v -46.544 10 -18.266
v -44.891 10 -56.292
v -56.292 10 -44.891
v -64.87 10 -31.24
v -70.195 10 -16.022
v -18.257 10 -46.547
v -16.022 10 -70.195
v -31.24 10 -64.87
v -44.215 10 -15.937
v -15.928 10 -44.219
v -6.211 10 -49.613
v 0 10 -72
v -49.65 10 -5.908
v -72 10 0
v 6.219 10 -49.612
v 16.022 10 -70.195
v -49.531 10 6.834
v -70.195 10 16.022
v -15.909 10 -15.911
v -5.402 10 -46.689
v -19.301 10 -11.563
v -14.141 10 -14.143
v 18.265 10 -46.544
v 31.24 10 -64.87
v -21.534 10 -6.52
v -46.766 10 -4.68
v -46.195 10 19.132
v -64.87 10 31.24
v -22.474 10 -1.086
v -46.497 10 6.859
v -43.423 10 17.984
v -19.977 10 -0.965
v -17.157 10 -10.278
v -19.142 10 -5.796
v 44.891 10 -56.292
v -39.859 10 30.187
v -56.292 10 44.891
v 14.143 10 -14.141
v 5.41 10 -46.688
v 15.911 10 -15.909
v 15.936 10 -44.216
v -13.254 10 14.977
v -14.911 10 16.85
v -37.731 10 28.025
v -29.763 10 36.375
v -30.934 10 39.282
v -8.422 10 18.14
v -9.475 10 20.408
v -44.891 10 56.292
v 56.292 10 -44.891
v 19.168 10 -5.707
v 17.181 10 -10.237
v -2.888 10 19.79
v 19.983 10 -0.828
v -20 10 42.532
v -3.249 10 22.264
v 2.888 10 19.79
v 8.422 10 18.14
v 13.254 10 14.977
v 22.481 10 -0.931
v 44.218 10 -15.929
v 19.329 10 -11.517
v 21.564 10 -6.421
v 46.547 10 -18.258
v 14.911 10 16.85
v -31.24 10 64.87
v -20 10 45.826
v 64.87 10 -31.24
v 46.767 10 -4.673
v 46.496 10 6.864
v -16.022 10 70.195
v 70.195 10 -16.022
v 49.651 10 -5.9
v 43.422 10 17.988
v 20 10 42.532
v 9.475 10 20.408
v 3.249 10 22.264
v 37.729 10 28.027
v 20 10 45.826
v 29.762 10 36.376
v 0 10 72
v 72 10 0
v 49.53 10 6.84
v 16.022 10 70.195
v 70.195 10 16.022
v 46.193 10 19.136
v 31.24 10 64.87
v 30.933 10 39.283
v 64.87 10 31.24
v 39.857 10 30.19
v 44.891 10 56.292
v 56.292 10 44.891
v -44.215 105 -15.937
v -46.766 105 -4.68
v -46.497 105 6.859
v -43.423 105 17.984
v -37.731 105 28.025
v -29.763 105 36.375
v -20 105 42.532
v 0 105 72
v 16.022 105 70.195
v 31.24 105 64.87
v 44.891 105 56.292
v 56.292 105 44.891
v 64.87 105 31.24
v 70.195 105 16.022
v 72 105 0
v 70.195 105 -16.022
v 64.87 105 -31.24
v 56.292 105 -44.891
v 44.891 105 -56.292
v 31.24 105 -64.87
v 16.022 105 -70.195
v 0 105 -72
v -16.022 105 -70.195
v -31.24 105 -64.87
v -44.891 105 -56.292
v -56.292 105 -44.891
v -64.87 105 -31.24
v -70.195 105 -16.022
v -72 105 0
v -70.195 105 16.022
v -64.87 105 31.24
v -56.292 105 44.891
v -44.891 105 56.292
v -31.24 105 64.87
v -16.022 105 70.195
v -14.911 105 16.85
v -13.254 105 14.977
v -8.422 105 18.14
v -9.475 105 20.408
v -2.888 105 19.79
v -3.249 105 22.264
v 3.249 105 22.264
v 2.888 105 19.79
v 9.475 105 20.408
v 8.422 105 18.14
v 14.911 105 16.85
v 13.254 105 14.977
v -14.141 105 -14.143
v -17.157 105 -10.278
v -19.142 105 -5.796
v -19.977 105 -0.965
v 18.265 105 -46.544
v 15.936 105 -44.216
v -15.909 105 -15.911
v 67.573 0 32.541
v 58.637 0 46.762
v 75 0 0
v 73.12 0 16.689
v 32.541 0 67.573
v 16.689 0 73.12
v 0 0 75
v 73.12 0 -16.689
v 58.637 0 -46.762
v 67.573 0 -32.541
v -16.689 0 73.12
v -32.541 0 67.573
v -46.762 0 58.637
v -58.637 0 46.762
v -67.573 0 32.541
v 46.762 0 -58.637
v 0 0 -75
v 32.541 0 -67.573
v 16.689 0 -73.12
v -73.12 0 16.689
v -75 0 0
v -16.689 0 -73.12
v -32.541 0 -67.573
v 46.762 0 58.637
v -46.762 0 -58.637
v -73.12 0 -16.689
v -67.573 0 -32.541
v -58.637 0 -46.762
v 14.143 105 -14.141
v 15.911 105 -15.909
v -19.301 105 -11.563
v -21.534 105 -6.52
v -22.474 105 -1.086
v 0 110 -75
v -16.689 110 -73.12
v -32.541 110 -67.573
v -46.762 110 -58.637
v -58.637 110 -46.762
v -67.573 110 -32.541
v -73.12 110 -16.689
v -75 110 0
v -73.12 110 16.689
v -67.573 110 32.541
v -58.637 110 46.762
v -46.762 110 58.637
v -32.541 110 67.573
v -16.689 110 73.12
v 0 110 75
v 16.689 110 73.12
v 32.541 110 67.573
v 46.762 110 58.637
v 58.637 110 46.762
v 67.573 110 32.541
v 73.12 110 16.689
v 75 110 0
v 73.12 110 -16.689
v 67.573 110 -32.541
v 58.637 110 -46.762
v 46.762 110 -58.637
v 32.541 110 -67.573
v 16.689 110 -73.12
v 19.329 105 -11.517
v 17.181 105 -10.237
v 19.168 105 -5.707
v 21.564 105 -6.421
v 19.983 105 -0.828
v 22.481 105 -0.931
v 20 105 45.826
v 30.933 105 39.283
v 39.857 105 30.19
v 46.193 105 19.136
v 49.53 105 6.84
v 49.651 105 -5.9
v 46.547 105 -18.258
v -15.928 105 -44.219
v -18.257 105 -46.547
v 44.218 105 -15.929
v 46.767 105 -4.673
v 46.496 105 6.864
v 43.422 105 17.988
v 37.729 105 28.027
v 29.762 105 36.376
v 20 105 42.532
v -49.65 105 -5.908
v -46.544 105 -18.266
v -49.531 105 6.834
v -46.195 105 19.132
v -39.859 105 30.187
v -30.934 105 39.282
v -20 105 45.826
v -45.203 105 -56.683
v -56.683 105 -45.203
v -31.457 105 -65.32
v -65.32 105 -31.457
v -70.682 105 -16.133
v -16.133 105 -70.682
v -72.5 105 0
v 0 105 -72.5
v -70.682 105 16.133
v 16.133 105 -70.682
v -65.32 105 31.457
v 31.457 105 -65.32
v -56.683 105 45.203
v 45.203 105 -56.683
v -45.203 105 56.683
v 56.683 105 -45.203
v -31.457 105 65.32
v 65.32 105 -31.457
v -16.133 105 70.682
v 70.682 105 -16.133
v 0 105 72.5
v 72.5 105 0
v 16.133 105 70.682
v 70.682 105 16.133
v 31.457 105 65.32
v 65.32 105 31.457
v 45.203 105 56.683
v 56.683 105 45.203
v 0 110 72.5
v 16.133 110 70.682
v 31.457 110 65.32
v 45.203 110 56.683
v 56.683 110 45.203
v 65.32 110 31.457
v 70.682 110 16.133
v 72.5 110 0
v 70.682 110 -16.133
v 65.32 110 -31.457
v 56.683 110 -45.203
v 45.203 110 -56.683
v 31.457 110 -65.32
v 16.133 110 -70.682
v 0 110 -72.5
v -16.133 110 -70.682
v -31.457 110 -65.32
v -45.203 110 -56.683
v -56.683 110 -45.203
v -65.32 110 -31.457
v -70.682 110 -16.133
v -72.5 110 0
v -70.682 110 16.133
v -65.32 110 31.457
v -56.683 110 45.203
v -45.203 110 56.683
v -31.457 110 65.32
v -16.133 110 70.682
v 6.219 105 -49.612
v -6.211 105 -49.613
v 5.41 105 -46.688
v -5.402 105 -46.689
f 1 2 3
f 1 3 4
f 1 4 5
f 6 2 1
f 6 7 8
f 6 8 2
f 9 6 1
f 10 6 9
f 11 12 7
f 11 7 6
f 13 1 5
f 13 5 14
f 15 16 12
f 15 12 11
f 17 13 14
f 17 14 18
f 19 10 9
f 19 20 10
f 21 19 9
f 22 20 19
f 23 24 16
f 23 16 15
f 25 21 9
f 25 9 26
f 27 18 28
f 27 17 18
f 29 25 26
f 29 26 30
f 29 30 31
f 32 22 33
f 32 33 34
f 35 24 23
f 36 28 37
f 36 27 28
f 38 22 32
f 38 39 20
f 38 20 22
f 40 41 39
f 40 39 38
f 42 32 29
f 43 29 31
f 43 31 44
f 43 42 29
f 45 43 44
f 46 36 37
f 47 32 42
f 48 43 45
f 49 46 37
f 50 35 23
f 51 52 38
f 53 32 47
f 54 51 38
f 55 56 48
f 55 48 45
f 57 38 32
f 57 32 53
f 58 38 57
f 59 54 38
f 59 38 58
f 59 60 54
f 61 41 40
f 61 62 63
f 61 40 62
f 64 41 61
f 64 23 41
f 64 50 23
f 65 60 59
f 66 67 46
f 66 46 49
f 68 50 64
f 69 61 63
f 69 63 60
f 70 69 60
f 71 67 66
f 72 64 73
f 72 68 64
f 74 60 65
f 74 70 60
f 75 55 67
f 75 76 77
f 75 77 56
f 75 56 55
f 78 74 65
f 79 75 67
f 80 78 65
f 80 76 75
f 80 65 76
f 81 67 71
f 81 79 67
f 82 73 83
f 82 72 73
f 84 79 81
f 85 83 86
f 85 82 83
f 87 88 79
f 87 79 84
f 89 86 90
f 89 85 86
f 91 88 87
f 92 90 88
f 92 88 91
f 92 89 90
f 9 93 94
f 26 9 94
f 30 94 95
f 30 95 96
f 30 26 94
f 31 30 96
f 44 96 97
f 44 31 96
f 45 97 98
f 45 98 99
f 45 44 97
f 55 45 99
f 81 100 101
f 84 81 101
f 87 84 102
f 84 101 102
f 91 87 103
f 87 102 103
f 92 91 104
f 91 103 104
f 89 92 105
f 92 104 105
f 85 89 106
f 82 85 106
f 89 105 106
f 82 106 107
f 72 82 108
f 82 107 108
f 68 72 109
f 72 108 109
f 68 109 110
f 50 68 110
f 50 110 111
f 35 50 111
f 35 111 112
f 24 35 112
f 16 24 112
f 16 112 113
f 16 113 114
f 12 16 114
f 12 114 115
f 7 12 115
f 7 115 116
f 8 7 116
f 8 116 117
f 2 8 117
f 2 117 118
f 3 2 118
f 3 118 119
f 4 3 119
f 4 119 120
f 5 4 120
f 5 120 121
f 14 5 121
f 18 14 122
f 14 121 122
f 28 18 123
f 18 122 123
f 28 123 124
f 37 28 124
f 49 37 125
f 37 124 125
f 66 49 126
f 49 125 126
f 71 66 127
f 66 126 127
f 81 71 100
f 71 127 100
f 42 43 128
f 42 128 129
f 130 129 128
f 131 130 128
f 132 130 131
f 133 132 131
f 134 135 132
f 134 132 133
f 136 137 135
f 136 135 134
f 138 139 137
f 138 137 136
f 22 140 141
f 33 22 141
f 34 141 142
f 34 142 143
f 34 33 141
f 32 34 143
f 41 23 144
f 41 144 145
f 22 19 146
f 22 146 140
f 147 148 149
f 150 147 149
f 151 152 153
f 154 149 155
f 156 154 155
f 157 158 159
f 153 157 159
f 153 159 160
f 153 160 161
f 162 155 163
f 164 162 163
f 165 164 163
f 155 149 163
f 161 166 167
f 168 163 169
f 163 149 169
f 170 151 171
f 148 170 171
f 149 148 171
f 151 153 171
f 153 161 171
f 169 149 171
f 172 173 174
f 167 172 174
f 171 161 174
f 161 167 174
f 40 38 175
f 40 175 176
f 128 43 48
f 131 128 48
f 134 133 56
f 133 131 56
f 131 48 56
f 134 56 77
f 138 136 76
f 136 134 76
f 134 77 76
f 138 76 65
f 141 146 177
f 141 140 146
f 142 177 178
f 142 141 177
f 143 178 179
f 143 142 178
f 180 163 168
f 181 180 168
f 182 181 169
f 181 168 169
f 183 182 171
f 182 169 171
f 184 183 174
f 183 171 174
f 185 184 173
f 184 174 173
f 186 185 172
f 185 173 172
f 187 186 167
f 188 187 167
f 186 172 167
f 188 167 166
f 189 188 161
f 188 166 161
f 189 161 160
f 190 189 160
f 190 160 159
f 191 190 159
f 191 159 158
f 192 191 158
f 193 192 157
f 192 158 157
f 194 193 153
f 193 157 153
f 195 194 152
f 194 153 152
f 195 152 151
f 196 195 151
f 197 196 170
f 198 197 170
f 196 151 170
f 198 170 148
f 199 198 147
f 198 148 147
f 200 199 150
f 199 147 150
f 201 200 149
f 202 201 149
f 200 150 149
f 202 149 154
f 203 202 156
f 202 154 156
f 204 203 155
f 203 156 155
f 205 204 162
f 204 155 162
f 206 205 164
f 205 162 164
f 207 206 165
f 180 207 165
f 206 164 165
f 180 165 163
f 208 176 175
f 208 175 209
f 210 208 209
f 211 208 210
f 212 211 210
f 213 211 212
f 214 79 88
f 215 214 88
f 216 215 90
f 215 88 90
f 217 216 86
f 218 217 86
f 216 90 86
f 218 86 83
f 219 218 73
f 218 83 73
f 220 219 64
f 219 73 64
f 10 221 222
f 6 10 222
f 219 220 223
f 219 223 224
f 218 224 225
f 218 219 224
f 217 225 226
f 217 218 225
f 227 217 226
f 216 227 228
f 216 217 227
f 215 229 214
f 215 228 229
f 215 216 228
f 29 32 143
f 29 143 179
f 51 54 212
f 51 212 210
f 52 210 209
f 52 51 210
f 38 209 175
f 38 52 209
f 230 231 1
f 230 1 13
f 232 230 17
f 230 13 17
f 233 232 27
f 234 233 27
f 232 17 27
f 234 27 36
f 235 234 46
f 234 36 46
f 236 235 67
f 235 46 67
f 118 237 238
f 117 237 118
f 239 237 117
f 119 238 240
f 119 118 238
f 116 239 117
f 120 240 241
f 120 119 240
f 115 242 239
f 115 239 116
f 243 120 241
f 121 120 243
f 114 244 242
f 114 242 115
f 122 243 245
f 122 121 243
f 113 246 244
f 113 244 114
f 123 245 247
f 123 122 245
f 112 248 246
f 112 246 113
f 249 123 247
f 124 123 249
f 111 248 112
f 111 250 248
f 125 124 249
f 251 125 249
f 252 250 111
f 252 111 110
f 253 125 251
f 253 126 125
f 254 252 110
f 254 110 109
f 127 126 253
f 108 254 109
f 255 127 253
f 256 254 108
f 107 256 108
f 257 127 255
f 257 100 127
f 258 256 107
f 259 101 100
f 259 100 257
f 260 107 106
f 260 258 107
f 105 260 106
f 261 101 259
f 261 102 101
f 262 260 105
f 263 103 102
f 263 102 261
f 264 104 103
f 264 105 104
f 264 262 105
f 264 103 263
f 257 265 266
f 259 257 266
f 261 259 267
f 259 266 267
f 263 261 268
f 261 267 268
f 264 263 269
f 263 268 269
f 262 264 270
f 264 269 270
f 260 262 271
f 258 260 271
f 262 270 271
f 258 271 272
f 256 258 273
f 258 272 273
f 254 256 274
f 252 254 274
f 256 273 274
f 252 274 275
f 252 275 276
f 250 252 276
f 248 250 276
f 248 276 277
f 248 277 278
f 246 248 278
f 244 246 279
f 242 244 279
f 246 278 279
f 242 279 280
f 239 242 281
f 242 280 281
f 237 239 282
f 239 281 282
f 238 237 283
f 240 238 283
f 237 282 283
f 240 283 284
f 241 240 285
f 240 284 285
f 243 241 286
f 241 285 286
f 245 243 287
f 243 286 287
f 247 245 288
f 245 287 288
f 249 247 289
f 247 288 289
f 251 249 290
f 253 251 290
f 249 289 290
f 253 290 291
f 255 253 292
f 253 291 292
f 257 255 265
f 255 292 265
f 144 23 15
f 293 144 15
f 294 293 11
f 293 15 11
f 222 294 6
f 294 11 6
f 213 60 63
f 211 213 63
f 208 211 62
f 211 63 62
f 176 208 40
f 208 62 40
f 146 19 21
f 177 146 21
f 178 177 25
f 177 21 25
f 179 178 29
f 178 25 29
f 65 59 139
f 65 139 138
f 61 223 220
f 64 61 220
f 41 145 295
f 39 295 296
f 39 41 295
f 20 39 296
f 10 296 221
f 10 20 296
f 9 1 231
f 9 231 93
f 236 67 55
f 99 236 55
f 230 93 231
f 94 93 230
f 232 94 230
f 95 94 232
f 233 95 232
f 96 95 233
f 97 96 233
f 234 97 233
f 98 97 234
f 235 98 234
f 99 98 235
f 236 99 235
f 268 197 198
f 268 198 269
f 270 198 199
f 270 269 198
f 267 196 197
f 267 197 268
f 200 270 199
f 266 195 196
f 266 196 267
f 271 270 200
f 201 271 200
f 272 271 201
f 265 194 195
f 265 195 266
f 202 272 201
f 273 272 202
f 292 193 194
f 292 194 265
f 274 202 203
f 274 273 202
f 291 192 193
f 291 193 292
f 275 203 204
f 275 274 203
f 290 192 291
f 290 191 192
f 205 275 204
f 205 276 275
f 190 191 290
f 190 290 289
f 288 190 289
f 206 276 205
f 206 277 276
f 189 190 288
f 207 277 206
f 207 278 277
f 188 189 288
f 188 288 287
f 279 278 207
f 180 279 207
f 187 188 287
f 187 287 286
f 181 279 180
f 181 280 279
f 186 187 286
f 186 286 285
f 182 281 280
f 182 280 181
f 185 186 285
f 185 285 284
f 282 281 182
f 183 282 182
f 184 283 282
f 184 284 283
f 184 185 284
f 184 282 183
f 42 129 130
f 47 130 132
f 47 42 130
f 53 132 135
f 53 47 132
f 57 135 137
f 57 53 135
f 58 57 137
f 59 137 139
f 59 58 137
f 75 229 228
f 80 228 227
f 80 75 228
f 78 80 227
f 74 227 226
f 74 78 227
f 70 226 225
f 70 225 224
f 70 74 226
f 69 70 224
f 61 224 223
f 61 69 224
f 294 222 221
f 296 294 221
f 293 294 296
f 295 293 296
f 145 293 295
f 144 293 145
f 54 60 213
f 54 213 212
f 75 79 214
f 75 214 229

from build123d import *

# Parameters (mm, degrees)
SKETCH1_R           = 75
BOSS_EXTRUDE1_DEPTH = 110
SKETCH2_R           = 72
CUT_EXTRUDE1_DEPTH  = 100
SKETCH3_R           = 72.5
CUT_EXTRUDE2_DEPTH  = 5
SKETCH8_R           = 50
SKETCH8_R_2         = 47
BOSS_EXTRUDE4_DEPTH = 95
SKETCH10_R          = 22.5
SKETCH10_R_2        = 20
BOSS_EXTRUDE5_DEPTH = 95
CUT_EXTRUDE3_START  = -95
SKETCH11_W          = 20
SKETCH11_H          = 27.4
CUT_EXTRUDE3_DEPTH  = 95


with BuildPart() as part:
    # Sketch1 → Boss-Extrude1 (new body)
    with BuildSketch(Plane(origin=(0, 0, 0), x_dir=(1, 0, 0), z_dir=(0, 1, 0))):
        with Locations(Location((0, 0, 0), (0, 0, 90))):
            Circle(SKETCH1_R)
    extrude(amount=BOSS_EXTRUDE1_DEPTH)

    # Sketch2 → Cut-Extrude1 (cut)
    with BuildSketch(Plane(origin=(0, 110, 0), x_dir=(1, 0, 0), z_dir=(0, 1, 0))):
        with Locations(Location((0, 0, 0), (0, 0, 270))):
            Circle(SKETCH2_R)
    extrude(amount=-CUT_EXTRUDE1_DEPTH, mode=Mode.SUBTRACT)

    # Sketch3 → Cut-Extrude2 (cut)
    with BuildSketch(Plane(origin=(0, 110, 0), x_dir=(1, 0, 0), z_dir=(0, 1, 0))):
        with Locations(Location((0, 0, 0), (0, 0, 270))):
            Circle(SKETCH3_R)
    extrude(amount=-CUT_EXTRUDE2_DEPTH, mode=Mode.SUBTRACT)

    # Sketch8 → Boss-Extrude4 (add)
    with BuildSketch(Plane(origin=(0, 10, 0), x_dir=(1, 0, 0), z_dir=(0, 1, 0))):
        with Locations(Location((0, 0, 0), (0, 0, 270))):
            Circle(SKETCH8_R)
        with Locations(Location((0, 0, 0), (0, 0, 270))):
            Circle(SKETCH8_R_2, mode=Mode.SUBTRACT)
    extrude(amount=BOSS_EXTRUDE4_DEPTH)

    # Sketch10 → Boss-Extrude5 (add)
    with BuildSketch(Plane(origin=(0, 10, 0), x_dir=(1, 0, 0), z_dir=(0, 1, 0))):
        with Locations(Location((0, 0, 0), (0, 0, 270))):
            Circle(SKETCH10_R)
        with Locations(Location((0, 0, 0), (0, 0, 270))):
            Circle(SKETCH10_R_2, mode=Mode.SUBTRACT)
    extrude(amount=BOSS_EXTRUDE5_DEPTH)

    # Sketch11 → Cut-Extrude3 (cut)
    with BuildSketch(Plane(origin=(0, 105, 0), x_dir=(1, 0, 0), z_dir=(0, 1, 0)).offset(CUT_EXTRUDE3_START)):
        with Locations((-10, -36.3)):
            Rectangle(SKETCH11_W, SKETCH11_H)
        with Locations((10, -36.3)):
            Rectangle(SKETCH11_W, SKETCH11_H)
        Polygon((-35.352400393, 35.358277481), (-15.986116357, 15.988773936), (-15.984553545, 15.990430632), (-2.254814273, 30.544962608), (-21.21026477, 49.500413105), align=None)
        Polygon((-49.494536017, 21.216141857), (-29.714292817, 1.435898657), (-15.986116357, 15.988773936), (-35.352400393, 35.358277481), align=None)
        Polygon((2.486026551, 30.767534041), (15.99775062, 15.995091549), (35.358277481, 35.352400393), (21.217317324, 49.495711386), align=None)
        Polygon((35.358277481, 35.352400393), (15.99775062, 15.995091549), (29.509474689, 1.222649056), (49.499237638, 21.209089401), align=None)
        with BuildLine():
            ThreePointArc((-13.25433726, -14.977401103), (-18.428729118, -7.770581901), (-19.97668921, 0.96534356))
            Line((-19.97668921, 0.96534356), (-22.473775362, 1.086011505))
            ThreePointArc((-22.473775362, 1.086011505), (-20.732320258, -8.741904639), (-14.911129417, -16.849576241))
            Line((-14.911129417, -16.849576241), (-13.25433726, -14.977401103))
        make_face()
        with BuildLine():
            ThreePointArc((20, 0), (18.235771785, -8.213198366), (13.25433726, -14.977401103))
            Line((13.25433726, -14.977401103), (14.911129417, -16.849576241))
            ThreePointArc((14.911129417, -16.849576241), (20.515243258, -9.239848162), (22.5, 0))
            ThreePointArc((22.5, 0), (22.495177624, 0.46581504), (22.480712564, 0.931430406))
            Line((22.480712564, 0.931430406), (19.982855613, 0.827938139))
            ThreePointArc((19.982855613, 0.827938139), (19.995713444, 0.414057814), (20, 0))
        make_face()
        with BuildLine():
            Line((-15.908580177, 15.911224866), (-14.140960157, 14.143310992))
            ThreePointArc((-14.140960157, 14.143310992), (0.001662291, 19.999999931), (14.143310992, 14.140960157))
            Line((14.143310992, 14.140960157), (15.911224866, 15.908580177))
            ThreePointArc((15.911224866, 15.908580177), (0.001870078, 22.499999922), (-15.908580177, 15.911224866))
        make_face()
    extrude(amount=CUT_EXTRUDE3_DEPTH, mode=Mode.SUBTRACT)


solid = part.part
